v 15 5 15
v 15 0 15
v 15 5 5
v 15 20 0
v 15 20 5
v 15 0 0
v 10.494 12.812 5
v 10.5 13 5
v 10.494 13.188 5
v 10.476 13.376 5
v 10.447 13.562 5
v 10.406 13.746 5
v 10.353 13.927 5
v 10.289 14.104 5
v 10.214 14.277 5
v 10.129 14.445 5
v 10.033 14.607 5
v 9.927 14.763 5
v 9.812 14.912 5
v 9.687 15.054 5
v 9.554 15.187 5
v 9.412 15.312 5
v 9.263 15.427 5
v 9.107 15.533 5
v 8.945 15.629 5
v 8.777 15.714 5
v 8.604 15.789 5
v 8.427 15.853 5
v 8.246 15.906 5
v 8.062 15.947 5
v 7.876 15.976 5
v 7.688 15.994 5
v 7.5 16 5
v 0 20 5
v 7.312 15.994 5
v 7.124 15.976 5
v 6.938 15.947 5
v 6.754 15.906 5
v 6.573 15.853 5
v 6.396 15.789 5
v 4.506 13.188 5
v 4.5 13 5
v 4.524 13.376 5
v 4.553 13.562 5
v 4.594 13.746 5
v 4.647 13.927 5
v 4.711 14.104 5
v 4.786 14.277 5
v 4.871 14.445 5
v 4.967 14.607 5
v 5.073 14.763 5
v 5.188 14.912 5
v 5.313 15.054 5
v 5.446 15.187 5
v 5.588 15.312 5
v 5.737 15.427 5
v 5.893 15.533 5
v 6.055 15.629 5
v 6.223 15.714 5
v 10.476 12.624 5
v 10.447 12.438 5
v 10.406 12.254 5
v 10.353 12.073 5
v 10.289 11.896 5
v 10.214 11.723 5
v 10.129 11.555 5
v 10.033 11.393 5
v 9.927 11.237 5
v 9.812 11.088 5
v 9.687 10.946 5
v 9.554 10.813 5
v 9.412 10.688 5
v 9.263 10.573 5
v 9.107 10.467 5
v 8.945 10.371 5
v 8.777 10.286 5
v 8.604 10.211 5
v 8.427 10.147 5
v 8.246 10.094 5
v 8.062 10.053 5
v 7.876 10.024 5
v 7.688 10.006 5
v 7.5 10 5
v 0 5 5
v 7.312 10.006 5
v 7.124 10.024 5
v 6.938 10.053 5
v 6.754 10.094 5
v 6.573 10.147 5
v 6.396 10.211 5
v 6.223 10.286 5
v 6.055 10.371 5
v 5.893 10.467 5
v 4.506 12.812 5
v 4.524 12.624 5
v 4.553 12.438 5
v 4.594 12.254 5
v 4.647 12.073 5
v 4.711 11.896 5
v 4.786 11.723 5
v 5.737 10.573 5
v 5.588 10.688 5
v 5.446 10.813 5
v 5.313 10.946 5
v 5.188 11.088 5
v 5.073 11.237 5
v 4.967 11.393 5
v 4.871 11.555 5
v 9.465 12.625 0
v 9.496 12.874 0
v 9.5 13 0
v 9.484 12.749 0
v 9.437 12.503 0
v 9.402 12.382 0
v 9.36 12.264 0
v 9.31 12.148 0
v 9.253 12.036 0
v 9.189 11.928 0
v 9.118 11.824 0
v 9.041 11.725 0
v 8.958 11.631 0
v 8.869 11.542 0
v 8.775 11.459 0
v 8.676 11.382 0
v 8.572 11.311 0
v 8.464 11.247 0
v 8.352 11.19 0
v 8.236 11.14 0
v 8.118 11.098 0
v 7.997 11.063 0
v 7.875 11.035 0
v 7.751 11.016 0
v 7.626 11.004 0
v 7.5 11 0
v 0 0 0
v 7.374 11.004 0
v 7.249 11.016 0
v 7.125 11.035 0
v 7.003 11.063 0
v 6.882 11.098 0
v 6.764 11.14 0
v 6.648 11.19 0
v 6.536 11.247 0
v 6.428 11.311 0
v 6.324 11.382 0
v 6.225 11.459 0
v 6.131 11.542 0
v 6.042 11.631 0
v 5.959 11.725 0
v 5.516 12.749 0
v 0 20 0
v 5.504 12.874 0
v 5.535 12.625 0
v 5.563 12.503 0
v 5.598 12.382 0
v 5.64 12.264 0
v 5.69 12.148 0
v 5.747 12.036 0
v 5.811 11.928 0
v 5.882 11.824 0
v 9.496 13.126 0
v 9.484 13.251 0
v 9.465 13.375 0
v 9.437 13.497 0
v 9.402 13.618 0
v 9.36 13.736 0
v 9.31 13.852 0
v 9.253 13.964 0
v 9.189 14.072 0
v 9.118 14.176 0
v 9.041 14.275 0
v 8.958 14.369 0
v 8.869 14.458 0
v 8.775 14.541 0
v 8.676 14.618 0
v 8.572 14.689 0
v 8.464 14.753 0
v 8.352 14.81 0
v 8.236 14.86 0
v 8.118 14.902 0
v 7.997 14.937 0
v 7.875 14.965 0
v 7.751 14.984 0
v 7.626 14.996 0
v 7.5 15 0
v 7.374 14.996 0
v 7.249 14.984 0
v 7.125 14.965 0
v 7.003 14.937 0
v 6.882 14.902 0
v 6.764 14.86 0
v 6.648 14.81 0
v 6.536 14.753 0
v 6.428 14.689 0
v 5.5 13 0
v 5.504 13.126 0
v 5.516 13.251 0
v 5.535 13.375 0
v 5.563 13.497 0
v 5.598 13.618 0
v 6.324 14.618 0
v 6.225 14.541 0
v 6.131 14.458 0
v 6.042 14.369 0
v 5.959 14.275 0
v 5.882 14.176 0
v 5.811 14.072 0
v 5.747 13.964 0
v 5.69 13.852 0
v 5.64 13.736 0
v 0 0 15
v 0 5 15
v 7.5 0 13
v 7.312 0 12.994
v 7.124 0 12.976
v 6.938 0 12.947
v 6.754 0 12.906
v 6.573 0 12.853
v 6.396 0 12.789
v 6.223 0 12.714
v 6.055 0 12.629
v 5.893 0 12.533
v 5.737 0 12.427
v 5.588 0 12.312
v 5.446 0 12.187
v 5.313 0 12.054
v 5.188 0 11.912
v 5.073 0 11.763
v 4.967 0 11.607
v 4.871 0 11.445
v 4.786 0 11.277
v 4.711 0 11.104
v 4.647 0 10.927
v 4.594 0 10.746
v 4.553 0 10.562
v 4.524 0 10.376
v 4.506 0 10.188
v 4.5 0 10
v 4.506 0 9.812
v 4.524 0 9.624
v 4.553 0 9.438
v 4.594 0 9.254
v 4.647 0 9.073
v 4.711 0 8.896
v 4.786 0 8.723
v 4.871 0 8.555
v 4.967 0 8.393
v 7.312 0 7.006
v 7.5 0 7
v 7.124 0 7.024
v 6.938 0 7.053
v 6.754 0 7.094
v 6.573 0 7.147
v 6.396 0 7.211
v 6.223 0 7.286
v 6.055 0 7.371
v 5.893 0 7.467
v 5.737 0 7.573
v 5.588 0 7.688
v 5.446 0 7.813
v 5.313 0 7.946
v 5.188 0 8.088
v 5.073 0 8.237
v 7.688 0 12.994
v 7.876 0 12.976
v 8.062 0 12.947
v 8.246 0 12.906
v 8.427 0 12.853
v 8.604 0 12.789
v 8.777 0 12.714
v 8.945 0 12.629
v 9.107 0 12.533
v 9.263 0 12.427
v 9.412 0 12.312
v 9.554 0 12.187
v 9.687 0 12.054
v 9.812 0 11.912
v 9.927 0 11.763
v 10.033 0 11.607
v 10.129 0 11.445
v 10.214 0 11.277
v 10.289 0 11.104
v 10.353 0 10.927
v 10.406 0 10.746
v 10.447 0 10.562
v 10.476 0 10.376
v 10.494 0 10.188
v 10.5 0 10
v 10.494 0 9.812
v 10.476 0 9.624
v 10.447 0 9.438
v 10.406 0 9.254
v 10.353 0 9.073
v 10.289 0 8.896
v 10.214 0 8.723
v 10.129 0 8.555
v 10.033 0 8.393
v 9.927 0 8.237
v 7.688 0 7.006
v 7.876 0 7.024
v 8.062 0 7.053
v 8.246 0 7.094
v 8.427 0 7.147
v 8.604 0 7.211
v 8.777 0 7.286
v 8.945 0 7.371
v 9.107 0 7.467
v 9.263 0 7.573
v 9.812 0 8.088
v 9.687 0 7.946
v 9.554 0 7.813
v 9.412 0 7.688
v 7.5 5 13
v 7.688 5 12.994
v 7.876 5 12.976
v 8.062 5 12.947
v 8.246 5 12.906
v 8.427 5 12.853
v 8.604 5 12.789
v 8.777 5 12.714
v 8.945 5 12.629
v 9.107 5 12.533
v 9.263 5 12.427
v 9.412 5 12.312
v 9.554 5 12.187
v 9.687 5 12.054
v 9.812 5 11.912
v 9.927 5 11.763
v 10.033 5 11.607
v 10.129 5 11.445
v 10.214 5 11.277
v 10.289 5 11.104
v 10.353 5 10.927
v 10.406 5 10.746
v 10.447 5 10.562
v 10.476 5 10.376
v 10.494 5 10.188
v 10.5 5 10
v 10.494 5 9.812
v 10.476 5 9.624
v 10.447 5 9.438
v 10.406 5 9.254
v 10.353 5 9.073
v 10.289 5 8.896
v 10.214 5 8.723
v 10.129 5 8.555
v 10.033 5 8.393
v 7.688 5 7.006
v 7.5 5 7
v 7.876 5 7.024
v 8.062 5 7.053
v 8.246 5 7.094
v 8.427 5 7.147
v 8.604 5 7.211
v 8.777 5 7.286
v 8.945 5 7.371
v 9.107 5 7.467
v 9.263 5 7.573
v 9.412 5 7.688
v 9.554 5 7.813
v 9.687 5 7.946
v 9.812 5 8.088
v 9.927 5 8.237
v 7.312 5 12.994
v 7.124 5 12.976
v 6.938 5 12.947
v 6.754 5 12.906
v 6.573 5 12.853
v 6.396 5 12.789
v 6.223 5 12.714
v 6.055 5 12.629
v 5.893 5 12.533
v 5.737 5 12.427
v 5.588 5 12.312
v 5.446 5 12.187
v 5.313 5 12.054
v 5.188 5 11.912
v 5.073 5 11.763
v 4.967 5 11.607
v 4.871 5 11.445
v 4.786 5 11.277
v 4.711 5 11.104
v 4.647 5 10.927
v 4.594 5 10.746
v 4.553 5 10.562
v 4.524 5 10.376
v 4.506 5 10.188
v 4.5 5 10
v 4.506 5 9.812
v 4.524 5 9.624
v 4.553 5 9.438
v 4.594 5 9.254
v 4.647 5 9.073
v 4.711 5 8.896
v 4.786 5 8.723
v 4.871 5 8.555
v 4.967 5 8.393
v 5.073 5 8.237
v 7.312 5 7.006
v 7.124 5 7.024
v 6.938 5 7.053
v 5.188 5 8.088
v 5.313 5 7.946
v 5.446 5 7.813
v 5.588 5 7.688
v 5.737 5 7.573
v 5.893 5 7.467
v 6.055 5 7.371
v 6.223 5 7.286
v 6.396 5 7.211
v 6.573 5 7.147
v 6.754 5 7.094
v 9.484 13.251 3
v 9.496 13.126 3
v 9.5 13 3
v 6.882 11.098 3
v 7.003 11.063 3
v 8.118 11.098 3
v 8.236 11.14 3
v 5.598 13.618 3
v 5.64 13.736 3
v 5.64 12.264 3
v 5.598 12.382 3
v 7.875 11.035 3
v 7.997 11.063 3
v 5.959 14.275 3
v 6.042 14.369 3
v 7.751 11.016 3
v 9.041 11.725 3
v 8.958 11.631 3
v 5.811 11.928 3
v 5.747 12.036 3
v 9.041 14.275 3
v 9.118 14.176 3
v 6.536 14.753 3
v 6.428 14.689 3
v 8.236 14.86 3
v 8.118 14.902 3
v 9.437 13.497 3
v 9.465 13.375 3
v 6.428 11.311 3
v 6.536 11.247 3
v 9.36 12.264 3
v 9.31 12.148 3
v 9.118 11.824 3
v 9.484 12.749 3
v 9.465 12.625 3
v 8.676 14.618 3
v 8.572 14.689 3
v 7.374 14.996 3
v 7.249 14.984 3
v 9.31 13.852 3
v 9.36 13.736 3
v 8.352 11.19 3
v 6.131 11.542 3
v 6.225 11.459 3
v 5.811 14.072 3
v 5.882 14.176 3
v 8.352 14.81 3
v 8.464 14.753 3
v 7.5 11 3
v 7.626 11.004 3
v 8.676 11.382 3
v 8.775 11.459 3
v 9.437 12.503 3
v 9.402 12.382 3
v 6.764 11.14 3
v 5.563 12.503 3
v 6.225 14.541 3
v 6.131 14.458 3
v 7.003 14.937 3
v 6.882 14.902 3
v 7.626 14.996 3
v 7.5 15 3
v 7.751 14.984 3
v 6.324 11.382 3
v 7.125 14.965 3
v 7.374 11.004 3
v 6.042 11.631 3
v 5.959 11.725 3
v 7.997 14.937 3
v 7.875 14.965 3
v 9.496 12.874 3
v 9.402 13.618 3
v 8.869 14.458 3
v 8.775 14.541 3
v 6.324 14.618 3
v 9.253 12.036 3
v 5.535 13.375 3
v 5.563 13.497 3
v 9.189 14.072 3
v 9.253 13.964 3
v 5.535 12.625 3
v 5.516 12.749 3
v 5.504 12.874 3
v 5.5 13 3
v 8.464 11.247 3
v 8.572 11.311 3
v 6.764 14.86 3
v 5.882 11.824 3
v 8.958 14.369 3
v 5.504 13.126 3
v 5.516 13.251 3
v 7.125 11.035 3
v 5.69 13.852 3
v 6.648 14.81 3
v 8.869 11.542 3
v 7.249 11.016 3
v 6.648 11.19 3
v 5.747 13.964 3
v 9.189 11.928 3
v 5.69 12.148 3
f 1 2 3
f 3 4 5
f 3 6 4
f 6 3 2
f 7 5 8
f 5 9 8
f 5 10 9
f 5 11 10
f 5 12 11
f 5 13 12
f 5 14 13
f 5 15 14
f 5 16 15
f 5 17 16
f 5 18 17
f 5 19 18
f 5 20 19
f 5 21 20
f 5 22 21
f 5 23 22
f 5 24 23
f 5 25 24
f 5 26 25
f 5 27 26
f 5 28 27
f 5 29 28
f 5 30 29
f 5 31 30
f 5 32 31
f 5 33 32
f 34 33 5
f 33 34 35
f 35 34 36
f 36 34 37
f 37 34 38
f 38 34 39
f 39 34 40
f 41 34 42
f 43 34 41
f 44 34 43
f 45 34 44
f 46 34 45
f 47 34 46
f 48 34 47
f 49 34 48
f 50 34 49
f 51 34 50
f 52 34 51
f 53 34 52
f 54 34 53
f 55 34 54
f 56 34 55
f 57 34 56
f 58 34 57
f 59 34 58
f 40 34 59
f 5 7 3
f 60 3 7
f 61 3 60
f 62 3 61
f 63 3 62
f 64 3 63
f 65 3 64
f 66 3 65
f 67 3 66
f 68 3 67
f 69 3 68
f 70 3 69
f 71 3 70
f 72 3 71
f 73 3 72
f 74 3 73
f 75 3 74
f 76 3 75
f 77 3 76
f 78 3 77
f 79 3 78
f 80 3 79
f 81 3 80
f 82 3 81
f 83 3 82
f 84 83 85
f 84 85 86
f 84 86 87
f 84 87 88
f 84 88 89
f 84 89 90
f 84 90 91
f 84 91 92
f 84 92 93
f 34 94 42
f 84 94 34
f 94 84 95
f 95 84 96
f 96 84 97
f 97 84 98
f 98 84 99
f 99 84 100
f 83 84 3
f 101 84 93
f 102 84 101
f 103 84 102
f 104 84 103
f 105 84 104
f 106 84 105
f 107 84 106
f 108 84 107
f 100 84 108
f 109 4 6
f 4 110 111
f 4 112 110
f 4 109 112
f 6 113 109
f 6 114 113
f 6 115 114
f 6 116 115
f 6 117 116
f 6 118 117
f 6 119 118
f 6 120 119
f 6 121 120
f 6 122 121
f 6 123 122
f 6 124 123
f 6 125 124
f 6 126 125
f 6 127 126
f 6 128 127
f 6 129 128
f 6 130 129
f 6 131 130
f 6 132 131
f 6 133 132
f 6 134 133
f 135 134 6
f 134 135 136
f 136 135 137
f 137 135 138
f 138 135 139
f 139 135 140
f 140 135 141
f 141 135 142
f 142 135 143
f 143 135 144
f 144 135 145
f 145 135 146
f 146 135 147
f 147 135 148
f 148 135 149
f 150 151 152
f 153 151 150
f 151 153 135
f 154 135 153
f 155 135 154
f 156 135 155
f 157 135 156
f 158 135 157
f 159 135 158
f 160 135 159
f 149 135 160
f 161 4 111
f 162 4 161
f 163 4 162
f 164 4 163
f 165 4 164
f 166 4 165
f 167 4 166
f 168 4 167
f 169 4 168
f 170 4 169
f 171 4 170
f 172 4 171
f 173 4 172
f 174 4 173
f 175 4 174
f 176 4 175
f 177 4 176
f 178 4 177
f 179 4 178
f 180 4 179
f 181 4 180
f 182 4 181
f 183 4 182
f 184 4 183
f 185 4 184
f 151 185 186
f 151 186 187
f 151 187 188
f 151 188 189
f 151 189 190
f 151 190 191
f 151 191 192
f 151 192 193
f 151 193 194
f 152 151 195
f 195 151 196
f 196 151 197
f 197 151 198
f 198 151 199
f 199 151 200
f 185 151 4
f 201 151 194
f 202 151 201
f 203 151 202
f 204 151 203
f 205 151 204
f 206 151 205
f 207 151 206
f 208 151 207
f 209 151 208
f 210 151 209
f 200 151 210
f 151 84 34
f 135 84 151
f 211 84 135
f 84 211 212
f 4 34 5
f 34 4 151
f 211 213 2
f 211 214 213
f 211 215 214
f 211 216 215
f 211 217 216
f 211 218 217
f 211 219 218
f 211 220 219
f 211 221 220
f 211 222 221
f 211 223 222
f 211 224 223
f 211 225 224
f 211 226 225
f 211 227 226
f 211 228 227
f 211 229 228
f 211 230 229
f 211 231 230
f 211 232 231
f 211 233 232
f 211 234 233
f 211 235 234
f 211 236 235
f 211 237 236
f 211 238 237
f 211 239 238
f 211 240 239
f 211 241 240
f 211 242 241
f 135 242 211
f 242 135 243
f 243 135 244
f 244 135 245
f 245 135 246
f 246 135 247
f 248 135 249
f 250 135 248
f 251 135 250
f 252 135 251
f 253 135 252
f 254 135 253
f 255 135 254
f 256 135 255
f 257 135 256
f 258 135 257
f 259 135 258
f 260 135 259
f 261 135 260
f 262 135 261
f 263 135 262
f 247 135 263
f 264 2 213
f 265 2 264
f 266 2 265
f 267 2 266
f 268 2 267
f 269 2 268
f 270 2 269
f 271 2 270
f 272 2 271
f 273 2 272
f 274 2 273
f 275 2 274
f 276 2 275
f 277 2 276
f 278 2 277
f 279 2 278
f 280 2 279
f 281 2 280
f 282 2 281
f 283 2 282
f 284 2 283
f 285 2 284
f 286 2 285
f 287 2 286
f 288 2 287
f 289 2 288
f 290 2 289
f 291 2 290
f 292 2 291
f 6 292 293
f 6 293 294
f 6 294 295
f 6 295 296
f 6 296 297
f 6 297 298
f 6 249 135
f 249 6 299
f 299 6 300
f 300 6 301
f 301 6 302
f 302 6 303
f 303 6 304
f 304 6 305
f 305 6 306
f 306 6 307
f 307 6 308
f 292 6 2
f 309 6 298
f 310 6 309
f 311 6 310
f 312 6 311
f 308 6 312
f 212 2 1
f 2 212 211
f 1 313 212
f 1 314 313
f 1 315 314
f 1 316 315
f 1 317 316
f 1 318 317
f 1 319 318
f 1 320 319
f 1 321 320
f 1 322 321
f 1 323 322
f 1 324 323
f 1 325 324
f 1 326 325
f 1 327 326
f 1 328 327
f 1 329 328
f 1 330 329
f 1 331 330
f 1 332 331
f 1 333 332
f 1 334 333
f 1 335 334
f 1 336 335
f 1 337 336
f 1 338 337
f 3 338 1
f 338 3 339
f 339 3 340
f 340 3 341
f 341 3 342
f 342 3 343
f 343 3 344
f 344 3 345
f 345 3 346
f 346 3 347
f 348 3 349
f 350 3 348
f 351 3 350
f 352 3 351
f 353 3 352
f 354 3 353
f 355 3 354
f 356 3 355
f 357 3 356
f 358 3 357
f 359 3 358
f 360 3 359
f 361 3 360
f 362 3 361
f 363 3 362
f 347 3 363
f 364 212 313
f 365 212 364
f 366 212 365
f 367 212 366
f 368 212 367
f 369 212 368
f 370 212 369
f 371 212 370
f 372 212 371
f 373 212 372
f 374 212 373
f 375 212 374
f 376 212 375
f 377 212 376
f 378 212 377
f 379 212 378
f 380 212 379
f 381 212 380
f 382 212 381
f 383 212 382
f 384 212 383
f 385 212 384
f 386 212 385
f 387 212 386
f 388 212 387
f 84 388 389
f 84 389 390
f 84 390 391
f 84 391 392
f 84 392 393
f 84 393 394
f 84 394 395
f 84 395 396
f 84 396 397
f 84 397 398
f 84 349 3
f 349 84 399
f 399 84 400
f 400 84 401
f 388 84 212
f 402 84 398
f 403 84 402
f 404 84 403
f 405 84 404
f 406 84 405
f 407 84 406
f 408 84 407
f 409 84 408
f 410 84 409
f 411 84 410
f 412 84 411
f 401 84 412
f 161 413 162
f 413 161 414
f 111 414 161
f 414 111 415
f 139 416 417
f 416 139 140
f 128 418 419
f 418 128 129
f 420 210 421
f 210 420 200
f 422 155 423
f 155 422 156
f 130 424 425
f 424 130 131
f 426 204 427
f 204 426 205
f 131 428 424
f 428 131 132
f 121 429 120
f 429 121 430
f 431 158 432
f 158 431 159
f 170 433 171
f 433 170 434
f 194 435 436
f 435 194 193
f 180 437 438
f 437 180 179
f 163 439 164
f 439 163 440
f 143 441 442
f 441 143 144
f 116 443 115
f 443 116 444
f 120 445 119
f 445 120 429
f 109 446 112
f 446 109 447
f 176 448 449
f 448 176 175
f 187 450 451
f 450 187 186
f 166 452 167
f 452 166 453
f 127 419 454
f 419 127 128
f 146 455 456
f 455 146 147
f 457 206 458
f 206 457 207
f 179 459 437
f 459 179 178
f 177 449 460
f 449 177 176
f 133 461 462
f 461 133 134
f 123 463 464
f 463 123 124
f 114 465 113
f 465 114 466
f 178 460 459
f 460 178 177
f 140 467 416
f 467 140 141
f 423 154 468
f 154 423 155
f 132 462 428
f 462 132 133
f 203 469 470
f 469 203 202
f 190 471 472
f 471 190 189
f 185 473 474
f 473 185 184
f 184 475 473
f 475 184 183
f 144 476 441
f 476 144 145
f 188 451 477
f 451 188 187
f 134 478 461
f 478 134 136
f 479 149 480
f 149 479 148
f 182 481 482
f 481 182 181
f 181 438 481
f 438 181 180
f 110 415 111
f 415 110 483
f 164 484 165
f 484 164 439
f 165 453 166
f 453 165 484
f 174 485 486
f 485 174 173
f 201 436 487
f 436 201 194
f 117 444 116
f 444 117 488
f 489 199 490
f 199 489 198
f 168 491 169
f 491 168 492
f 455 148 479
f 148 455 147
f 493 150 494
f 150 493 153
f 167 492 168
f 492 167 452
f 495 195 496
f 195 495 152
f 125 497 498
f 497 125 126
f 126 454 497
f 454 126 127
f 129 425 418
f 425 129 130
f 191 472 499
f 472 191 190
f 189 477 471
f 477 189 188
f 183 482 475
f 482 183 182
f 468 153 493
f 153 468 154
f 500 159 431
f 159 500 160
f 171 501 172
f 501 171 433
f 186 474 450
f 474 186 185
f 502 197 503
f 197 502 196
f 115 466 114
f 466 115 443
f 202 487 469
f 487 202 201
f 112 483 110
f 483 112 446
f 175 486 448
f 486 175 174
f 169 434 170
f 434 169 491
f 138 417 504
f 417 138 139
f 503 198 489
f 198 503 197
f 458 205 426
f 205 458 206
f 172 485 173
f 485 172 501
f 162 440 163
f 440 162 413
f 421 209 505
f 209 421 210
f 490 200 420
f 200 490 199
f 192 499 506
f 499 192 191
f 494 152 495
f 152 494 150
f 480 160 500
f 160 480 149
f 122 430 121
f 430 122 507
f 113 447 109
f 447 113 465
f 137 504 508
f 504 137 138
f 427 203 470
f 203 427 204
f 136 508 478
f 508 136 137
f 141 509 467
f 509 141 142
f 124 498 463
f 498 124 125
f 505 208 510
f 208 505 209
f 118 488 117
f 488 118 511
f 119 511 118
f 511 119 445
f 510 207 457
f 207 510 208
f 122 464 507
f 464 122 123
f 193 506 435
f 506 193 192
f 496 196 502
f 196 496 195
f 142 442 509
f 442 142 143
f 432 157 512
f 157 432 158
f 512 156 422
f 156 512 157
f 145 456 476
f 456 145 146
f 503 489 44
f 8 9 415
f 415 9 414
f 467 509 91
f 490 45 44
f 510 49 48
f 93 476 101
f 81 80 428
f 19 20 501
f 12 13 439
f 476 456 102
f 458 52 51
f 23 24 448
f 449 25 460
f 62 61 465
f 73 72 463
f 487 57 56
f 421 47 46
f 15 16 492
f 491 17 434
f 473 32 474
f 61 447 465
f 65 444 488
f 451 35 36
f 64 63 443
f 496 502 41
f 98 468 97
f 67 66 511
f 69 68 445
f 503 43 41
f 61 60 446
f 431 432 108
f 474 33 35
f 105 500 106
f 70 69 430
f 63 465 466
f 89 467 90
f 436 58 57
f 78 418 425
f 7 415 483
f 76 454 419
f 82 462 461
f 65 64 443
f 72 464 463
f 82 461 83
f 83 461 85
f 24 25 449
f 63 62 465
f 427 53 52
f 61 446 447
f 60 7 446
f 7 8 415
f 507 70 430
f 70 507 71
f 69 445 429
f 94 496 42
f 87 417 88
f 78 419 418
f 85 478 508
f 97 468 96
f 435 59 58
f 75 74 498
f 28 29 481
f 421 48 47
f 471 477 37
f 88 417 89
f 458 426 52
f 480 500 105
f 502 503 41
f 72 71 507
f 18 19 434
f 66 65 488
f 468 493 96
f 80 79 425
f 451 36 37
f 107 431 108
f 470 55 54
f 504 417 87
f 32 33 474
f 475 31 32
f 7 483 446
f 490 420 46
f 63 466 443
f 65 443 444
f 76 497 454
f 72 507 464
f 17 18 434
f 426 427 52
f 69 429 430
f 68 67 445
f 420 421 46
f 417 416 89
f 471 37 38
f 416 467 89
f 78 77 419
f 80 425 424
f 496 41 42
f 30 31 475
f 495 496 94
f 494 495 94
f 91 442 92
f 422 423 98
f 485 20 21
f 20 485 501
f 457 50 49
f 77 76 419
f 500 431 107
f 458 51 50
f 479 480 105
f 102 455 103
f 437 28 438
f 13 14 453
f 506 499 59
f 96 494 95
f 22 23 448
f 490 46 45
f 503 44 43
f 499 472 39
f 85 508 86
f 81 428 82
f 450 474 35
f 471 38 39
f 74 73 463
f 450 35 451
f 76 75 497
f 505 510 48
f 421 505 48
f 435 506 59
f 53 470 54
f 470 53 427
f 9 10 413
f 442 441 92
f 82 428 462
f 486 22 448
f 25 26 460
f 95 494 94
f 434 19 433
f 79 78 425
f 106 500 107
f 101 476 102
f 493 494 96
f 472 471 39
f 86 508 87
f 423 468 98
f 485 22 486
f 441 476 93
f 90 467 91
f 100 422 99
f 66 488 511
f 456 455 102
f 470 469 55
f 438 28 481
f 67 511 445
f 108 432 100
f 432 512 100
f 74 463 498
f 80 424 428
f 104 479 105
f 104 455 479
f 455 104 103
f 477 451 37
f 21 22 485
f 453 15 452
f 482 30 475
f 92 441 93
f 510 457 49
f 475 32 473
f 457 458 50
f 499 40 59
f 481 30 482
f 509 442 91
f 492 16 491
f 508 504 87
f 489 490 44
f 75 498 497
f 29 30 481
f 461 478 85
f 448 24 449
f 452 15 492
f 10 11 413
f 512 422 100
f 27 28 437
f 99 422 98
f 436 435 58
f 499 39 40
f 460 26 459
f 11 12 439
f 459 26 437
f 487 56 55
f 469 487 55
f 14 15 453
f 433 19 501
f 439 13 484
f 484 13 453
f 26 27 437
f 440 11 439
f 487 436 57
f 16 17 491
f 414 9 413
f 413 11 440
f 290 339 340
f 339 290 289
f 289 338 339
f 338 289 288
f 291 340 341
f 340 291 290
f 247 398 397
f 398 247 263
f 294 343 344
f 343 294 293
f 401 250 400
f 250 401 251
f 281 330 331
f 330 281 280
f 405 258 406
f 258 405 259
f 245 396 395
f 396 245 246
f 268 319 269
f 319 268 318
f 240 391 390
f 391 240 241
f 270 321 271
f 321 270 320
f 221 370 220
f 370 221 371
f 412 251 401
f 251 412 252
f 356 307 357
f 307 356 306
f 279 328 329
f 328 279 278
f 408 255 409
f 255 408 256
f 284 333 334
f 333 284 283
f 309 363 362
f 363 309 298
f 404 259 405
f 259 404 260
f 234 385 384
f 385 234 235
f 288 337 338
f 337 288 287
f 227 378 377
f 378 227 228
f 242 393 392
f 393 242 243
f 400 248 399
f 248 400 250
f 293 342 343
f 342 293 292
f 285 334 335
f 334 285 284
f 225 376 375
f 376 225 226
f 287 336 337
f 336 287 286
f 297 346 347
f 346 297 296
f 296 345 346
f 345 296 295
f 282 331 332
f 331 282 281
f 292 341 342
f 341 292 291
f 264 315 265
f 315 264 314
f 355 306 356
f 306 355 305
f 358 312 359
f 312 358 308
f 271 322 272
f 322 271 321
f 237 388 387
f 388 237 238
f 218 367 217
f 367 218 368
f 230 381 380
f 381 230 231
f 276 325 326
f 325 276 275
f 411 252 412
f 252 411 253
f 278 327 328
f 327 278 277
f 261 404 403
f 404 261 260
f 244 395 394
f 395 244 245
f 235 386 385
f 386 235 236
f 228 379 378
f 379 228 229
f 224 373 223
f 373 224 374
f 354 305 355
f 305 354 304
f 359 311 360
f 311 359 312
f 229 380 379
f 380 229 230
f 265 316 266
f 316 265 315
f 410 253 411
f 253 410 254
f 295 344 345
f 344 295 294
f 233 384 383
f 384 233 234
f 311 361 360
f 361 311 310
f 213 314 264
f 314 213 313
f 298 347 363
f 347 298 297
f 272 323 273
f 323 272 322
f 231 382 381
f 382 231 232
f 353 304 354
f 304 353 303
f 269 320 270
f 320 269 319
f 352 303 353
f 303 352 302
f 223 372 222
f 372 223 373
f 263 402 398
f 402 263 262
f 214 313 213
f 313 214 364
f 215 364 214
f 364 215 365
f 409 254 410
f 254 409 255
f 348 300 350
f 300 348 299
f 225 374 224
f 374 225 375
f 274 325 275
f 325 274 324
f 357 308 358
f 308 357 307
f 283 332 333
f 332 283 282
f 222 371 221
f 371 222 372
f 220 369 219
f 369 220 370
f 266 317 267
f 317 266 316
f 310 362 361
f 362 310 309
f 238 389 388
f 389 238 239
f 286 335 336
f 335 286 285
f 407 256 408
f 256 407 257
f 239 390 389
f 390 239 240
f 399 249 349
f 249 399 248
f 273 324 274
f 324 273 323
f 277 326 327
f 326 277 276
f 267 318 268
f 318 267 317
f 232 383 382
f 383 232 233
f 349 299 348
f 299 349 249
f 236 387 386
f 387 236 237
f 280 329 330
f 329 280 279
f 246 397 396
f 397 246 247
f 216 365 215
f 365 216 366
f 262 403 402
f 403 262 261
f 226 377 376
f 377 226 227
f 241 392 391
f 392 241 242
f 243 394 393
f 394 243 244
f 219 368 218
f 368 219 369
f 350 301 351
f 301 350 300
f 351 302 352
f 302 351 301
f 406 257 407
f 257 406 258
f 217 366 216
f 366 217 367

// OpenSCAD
// file: common.scad
module mount_screw_hole(depth) {
    screw_dia = 4;
    taper_depth = 2;

    cylinder(h=depth, d=screw_dia);
    translate([0, 0, depth - taper_depth])
    cylinder(h=taper_depth, d1=screw_dia, d2=screw_dia*1.5);
}

module stem_hole(h=5) {
    stem_dia = 9.5;
    cylinder(h=h, d=stem_dia);
}

module recess(h=25, rot=0, line_rot=0, extra_depth=0, line_dia=3.175, extra_line_depth=0) {
    mag_dia = 6.35;
    mag_depth = 15 + extra_depth;
    line_depth = h - mag_depth;
    
    rotate([rot,0,0])
    translate([0,0,h-mag_depth])
    {
        cylinder(h=mag_depth, d=mag_dia);
	rotate([line_rot,0,0])
	translate([0,0,-line_depth])
        cylinder(h=line_depth + 5 + extra_line_depth, d=line_dia);
    }
}

module tire(h, d, radius_frac=3) {
    radius = h/radius_frac;
    cylinder_height = h - 2*radius;
    cylinder_dia = d - 2*radius;

    translate([0,0,radius])
    minkowski() {
      cylinder(h=cylinder_height, d=cylinder_dia);
      sphere(radius);
    }
}
// main file
$fn = 100;

use <common.scad>

width = 15;
thickness = 5;
height = 10;
length = 20;

module mount() {
    cube([width, length, thickness]);
    cube([width, 5, height + thickness]);
}

module switch_hole() {
    translate([width/2,0,thickness + height / 2])
    rotate([-90,0,0])
    cylinder(h=thickness, d=6);
}

difference () {
    mount();
    switch_hole();
    translate([width/2,length-7,0])
    mount_screw_hole(thickness);
}
